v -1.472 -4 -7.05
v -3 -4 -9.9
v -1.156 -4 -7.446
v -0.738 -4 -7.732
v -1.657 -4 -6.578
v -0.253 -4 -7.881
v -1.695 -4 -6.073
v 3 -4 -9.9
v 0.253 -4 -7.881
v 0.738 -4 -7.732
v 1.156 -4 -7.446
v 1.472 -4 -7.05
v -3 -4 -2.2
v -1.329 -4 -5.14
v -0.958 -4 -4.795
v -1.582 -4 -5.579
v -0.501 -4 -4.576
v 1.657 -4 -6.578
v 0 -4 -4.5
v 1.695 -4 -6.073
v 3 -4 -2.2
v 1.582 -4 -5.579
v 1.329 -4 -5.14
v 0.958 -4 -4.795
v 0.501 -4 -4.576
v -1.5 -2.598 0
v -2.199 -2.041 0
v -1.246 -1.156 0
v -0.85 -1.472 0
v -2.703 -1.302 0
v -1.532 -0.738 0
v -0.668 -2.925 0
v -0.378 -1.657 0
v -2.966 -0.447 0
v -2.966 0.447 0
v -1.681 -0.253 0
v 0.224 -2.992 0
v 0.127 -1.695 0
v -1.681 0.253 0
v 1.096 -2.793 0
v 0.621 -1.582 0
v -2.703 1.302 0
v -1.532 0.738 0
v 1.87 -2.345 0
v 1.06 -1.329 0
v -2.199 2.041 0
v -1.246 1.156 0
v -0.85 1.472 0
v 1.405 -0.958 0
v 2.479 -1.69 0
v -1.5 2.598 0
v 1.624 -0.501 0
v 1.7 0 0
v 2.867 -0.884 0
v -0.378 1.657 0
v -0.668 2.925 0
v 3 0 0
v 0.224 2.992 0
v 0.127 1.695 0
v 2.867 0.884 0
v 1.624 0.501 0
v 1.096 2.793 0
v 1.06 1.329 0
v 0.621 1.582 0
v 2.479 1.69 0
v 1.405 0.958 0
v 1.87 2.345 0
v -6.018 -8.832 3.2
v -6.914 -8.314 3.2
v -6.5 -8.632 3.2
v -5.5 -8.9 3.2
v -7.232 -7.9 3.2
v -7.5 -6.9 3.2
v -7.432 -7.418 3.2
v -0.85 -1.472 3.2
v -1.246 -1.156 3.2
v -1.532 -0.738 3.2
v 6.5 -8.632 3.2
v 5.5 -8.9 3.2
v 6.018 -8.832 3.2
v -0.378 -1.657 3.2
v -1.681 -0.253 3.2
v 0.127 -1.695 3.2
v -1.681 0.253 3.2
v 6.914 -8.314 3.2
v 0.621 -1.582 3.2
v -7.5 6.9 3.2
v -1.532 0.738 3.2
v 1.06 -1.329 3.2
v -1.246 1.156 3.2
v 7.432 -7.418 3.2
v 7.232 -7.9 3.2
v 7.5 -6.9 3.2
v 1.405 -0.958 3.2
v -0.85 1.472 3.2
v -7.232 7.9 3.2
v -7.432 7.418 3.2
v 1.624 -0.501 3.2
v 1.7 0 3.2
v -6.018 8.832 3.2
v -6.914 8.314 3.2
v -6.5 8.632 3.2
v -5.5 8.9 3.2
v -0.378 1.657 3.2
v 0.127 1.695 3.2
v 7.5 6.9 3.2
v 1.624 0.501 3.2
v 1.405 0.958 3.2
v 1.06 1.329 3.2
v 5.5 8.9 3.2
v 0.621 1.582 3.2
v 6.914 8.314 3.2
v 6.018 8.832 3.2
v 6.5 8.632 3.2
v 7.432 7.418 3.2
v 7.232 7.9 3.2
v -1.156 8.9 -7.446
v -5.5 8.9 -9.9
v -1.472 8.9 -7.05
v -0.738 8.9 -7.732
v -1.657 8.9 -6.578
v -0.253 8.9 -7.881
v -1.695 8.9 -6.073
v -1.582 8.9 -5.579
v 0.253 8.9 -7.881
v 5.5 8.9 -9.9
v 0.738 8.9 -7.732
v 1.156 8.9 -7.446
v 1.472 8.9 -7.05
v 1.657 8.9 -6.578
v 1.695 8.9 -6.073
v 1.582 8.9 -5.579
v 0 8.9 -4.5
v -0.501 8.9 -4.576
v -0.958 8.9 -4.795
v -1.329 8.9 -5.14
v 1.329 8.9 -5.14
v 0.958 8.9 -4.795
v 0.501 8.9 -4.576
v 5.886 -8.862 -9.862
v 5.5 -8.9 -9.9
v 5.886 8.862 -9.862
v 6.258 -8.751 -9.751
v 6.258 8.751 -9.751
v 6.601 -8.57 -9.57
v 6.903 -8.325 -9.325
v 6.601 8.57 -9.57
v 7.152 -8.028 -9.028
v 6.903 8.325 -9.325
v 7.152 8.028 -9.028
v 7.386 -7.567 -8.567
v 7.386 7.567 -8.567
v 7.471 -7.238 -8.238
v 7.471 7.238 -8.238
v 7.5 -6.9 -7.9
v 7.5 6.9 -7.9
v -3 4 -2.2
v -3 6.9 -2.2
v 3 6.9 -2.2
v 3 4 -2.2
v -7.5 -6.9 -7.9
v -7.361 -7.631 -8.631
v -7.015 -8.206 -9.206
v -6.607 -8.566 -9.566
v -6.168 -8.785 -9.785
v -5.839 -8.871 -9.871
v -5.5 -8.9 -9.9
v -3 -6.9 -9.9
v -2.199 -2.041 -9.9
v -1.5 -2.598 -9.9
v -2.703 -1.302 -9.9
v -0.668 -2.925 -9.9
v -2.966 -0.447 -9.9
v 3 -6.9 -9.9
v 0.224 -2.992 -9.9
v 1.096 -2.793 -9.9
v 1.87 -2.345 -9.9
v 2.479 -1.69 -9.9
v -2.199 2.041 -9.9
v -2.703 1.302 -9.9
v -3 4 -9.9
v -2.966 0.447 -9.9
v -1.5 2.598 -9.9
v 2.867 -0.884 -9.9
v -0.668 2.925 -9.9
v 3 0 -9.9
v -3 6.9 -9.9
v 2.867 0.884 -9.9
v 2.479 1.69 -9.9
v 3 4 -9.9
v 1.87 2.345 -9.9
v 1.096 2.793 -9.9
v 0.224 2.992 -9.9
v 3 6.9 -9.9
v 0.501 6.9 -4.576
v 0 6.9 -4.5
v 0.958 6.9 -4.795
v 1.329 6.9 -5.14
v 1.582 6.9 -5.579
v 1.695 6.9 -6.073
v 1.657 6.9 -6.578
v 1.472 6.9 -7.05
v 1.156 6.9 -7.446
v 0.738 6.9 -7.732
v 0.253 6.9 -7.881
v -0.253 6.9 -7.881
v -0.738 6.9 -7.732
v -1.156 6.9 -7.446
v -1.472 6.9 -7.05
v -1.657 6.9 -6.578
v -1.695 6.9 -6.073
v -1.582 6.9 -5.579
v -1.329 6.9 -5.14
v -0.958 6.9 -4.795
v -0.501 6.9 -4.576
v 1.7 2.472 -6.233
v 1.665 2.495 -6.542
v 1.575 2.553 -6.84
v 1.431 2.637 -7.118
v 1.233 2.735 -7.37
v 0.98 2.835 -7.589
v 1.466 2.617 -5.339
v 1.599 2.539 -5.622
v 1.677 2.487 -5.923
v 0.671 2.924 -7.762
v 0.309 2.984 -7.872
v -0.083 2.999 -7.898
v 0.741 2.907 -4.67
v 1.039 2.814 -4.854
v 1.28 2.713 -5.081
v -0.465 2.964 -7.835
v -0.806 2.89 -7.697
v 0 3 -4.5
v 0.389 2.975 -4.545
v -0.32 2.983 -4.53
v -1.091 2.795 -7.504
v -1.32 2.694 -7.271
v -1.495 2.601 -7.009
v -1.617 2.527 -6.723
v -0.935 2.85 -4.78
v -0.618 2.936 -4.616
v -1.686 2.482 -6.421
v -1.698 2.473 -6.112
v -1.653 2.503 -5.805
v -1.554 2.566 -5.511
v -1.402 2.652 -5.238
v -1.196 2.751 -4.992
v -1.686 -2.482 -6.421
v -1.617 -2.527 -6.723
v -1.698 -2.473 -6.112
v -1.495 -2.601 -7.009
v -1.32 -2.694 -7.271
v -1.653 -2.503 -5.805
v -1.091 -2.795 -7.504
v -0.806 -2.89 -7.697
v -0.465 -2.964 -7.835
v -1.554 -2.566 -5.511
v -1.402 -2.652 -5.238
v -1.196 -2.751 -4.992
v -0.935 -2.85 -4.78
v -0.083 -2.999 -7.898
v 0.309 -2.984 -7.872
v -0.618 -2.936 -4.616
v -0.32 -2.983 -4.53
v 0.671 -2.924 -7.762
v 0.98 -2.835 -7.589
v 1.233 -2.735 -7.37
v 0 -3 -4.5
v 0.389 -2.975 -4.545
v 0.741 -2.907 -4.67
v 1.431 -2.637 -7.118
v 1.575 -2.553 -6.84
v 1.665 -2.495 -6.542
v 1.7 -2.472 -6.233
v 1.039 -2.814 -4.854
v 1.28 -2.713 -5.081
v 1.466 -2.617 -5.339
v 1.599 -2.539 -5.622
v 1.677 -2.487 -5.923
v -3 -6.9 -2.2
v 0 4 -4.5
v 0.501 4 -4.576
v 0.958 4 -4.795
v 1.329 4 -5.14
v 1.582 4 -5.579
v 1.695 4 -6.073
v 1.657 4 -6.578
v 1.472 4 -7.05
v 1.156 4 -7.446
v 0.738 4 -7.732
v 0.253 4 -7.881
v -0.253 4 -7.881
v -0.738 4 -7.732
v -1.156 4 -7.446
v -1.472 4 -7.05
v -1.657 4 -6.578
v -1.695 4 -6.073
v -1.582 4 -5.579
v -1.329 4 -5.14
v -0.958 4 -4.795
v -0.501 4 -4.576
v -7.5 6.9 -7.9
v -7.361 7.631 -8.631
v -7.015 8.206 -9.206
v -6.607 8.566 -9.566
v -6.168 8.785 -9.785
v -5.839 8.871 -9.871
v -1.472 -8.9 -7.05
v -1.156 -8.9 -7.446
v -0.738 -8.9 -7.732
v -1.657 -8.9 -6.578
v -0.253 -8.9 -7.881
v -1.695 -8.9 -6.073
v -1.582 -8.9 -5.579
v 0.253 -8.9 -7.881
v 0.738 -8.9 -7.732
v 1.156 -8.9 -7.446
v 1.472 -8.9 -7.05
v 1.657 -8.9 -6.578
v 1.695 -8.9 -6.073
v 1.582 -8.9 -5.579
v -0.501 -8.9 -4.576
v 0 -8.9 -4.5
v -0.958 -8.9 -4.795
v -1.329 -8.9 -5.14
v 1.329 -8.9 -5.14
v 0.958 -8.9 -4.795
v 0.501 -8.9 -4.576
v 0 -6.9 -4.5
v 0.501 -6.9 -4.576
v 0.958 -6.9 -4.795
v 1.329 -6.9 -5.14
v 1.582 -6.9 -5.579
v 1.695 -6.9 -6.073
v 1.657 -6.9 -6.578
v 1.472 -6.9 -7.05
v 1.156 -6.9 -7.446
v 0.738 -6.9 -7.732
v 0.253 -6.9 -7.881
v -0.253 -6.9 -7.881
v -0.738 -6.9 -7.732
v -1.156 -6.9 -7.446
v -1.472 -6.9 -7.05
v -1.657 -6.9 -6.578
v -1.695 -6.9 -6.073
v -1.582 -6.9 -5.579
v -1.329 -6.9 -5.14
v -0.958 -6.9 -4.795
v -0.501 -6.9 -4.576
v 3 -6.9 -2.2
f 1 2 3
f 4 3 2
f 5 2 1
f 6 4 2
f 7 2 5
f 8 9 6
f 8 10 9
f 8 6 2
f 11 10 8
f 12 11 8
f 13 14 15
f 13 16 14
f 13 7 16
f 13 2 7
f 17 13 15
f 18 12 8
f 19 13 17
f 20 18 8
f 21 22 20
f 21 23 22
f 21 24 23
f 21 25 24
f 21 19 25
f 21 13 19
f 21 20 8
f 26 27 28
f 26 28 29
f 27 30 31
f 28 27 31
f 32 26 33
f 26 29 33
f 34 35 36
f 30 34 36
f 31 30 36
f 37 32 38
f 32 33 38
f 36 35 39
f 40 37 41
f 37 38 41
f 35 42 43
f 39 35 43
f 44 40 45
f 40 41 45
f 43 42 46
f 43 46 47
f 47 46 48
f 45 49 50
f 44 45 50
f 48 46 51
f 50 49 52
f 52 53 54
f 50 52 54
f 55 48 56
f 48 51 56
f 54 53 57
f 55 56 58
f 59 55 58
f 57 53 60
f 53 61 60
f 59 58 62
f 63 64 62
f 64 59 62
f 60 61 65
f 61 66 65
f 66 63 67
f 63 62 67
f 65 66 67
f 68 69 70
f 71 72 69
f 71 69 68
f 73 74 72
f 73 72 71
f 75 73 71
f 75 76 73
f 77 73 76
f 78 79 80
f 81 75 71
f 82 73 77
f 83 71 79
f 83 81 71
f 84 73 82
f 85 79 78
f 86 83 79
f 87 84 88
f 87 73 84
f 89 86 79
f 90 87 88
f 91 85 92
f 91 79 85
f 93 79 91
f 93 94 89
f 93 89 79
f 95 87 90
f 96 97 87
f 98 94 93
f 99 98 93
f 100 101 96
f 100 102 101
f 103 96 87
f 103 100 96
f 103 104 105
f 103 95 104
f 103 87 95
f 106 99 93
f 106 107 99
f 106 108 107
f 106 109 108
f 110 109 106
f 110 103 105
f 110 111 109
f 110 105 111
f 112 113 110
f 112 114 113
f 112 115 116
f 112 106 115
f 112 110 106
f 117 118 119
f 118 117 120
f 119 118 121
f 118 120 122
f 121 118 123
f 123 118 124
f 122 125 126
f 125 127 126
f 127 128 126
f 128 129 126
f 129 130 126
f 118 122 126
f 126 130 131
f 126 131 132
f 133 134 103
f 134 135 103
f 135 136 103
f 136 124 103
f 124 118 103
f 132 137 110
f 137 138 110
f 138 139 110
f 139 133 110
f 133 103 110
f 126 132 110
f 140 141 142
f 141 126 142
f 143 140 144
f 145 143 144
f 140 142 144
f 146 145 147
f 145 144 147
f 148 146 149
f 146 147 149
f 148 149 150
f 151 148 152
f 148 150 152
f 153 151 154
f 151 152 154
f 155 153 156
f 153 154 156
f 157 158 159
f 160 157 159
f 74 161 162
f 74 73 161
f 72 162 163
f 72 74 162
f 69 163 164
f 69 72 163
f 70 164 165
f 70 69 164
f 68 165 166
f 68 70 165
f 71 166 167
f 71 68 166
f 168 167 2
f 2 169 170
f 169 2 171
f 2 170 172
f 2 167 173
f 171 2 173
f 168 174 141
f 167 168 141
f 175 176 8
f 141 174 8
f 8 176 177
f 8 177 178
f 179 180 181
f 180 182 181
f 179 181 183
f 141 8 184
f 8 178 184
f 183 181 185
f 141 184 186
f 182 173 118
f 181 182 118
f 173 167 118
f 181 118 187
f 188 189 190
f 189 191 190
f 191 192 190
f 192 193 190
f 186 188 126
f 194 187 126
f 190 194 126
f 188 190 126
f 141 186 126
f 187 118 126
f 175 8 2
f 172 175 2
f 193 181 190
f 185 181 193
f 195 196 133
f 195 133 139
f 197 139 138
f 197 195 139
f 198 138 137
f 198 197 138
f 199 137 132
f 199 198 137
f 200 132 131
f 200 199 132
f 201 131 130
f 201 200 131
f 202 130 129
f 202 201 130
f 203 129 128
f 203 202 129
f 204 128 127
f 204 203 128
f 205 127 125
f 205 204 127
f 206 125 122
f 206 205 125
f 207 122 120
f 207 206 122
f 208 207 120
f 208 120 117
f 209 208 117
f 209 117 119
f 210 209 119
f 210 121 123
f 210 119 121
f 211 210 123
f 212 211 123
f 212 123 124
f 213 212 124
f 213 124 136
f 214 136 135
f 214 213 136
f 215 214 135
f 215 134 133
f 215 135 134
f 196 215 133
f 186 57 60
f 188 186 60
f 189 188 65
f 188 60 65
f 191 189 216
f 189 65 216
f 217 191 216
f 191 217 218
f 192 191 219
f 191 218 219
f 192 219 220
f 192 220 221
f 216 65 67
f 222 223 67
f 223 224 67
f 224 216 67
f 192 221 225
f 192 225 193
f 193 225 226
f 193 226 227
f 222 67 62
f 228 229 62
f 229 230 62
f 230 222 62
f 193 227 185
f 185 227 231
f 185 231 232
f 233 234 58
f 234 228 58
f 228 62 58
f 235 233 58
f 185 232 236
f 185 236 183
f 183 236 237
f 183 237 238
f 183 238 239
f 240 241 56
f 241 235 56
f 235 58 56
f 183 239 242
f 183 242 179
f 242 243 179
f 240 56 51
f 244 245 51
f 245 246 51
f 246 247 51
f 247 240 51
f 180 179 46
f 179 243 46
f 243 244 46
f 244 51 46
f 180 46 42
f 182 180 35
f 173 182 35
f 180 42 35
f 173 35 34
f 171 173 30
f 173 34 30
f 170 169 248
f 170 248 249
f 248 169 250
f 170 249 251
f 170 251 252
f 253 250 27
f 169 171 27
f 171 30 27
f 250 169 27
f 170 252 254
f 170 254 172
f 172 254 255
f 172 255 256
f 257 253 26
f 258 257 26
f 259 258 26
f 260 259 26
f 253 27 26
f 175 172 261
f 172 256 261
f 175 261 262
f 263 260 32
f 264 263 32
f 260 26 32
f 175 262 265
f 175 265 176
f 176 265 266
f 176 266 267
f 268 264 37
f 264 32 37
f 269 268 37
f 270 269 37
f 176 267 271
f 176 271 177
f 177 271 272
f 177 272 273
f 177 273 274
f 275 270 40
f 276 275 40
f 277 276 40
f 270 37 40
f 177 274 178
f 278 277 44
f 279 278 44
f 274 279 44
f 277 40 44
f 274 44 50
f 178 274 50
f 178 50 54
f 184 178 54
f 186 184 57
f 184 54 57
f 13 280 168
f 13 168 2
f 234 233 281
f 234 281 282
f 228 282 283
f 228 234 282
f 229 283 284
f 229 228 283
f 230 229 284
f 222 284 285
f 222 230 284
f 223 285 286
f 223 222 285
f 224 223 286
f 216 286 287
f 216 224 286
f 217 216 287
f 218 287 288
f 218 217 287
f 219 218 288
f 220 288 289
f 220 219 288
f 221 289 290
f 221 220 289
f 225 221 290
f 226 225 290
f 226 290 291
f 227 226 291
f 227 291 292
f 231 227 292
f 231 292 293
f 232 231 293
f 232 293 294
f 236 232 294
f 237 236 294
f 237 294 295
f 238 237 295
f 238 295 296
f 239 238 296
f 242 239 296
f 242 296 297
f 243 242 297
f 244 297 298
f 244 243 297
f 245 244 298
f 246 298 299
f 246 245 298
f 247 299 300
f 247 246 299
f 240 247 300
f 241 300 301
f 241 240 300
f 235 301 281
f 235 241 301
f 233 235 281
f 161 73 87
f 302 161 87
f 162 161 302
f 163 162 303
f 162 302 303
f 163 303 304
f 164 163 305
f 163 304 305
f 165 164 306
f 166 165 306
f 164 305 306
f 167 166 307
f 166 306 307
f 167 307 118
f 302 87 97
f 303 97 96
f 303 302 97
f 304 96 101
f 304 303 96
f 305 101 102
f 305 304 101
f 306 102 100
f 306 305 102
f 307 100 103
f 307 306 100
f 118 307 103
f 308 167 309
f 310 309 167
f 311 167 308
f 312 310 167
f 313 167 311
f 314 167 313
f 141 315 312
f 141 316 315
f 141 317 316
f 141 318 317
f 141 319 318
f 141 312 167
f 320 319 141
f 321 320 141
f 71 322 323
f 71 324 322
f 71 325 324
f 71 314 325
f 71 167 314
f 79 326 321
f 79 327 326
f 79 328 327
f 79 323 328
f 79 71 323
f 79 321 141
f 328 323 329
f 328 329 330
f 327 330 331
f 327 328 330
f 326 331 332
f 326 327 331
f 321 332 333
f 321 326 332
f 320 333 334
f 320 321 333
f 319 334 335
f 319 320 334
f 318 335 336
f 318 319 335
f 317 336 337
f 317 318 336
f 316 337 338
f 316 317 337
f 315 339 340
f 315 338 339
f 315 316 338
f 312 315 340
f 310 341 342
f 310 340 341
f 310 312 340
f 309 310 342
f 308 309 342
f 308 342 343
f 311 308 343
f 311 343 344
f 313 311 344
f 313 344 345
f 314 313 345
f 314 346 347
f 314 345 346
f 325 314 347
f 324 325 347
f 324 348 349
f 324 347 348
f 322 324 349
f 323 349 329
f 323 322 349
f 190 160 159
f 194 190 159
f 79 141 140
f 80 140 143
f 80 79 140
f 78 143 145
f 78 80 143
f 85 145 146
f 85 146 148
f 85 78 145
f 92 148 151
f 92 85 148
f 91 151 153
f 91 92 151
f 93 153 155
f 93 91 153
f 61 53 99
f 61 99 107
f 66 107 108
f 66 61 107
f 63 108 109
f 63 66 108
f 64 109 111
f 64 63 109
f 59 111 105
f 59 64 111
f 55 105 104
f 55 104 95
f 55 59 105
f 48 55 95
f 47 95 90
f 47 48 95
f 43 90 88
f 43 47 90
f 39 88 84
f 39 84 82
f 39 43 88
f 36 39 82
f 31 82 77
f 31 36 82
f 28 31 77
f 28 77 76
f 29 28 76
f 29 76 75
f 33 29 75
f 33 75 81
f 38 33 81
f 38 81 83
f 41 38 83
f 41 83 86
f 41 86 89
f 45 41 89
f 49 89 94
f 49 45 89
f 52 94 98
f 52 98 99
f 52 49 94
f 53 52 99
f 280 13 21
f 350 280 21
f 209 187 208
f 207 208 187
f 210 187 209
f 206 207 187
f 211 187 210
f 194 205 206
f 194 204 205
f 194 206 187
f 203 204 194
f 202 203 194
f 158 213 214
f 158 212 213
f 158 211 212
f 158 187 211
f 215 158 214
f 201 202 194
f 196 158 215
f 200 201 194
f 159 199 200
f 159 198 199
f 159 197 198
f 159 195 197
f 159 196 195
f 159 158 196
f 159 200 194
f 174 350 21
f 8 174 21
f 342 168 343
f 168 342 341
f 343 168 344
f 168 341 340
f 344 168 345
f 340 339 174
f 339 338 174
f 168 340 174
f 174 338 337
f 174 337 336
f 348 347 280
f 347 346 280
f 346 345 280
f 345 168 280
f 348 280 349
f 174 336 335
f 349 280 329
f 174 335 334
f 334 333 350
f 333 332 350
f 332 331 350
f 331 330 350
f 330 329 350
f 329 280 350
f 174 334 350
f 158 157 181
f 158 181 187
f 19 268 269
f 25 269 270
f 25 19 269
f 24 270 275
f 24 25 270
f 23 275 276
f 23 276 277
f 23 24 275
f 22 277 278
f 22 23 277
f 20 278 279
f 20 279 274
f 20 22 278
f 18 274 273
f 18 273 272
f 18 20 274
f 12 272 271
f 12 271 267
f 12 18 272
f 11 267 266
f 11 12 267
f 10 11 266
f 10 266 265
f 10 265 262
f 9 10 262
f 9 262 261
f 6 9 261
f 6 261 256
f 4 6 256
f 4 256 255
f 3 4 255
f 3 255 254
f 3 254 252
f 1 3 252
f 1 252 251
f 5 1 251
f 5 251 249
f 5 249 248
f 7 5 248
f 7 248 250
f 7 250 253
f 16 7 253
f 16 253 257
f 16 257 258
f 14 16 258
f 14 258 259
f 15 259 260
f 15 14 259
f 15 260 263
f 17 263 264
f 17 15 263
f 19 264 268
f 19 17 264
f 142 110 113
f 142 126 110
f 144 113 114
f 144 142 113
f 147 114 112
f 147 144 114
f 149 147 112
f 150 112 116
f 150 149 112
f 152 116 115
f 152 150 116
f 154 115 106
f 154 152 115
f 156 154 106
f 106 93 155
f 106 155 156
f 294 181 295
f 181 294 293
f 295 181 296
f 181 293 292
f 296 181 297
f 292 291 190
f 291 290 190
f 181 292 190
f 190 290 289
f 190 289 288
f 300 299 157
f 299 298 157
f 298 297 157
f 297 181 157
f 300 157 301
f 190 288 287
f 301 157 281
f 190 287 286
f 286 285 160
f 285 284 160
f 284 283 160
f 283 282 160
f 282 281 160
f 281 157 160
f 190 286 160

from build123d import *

# Parameters (mm, degrees)
SKETCH_1_W               = 15
SKETCH_1_H               = 17.8
SKETCH_1_R               = 3
SKETCH_1_W_2             = 6
SKETCH_1_H_2             = 2.9
SKETCH_1_R_2             = 1.7
EXTRUDE_1_DEPTH          = 3.2
SKETCH_1_3_W             = 15
SKETCH_1_3_H             = 17.8
SKETCH_1_3_R             = 3
SKETCH_1_3_W_2           = 6
SKETCH_1_3_H_2           = 2.9
EXTRUDE_2_DEPTH          = 2.2
EXTRUDE_START            = -2.2
SKETCH_1_4_W             = 15
SKETCH_1_4_H             = 17.8
SKETCH_1_4_R             = 3
SKETCH_1_4_W_2           = 6
SKETCH_1_4_H_2           = 2.9
EXTRUDE_3_DEPTH          = 7.7
CUT_EXTRUDE_1_DEPTH      = 16.279725128
CUT_EXTRUDE_1_DEPTH_BACK = 16.279725128
SKETCH_2_R               = 1.7
FILLET_1_R               = 2


with BuildPart() as part:
    # 草图1 → 凸台-拉伸1 (new body)
    # profile 1 of 4: a face of its own
    with BuildSketch(Plane.XY):
        Rectangle(SKETCH_1_W, SKETCH_1_H)
        Circle(SKETCH_1_R, mode=Mode.SUBTRACT)
        with Locations((0, -5.45)):
            Rectangle(SKETCH_1_W_2, SKETCH_1_H_2, mode=Mode.SUBTRACT)
        with Locations((0, 5.45)):
            Rectangle(SKETCH_1_W_2, SKETCH_1_H_2, mode=Mode.SUBTRACT)
    # profile 2 of 4: a face of its own
    with BuildSketch(Plane.XY):
        Circle(SKETCH_1_R)
        Circle(SKETCH_1_R_2, mode=Mode.SUBTRACT)
    # profile 3 of 4: a face of its own
    with BuildSketch(Plane.XY):
        with Locations((0, 5.45)):
            Rectangle(SKETCH_1_W_2, SKETCH_1_H_2)
    # profile 4 of 4: a face of its own
    with BuildSketch(Plane.XY):
        with Locations((0, -5.45)):
            Rectangle(SKETCH_1_W_2, SKETCH_1_H_2)
    extrude(amount=EXTRUDE_1_DEPTH)

    # 草图1<3> → 凸台-拉伸2 (add)
    # profile 1 of 3: a face of its own
    with BuildSketch(Plane.XY):
        Rectangle(SKETCH_1_3_W, SKETCH_1_3_H)
        Circle(SKETCH_1_3_R, mode=Mode.SUBTRACT)
        with Locations((0, -5.45)):
            Rectangle(SKETCH_1_3_W_2, SKETCH_1_3_H_2, mode=Mode.SUBTRACT)
        with Locations((0, 5.45)):
            Rectangle(SKETCH_1_3_W_2, SKETCH_1_3_H_2, mode=Mode.SUBTRACT)
    # profile 2 of 3: a face of its own
    with BuildSketch(Plane.XY):
        with Locations((0, 5.45)):
            Rectangle(SKETCH_1_3_W_2, SKETCH_1_3_H_2)
    # profile 3 of 3: a face of its own
    with BuildSketch(Plane.XY):
        with Locations((0, -5.45)):
            Rectangle(SKETCH_1_3_W_2, SKETCH_1_3_H_2)
    extrude(amount=-EXTRUDE_2_DEPTH)

    # 草图1<4> → 凸台-拉伸3 (add)
    with BuildSketch(Plane.XY.offset(EXTRUDE_START)):
        Rectangle(SKETCH_1_4_W, SKETCH_1_4_H)
        Circle(SKETCH_1_4_R, mode=Mode.SUBTRACT)
        with Locations((0, -5.45)):
            Rectangle(SKETCH_1_4_W_2, SKETCH_1_4_H_2, mode=Mode.SUBTRACT)
        with Locations((0, 5.45)):
            Rectangle(SKETCH_1_4_W_2, SKETCH_1_4_H_2, mode=Mode.SUBTRACT)
    extrude(amount=-EXTRUDE_3_DEPTH)

    # 草图2 → 切除-拉伸1 (cut, two sides: drawn at the far end of the back side and taken through both)
    with BuildSketch(Plane(origin=(0, 0, 0), x_dir=(1, 0, 0), z_dir=(0, 1, 0)).offset(-CUT_EXTRUDE_1_DEPTH_BACK)):
        with Locations(Location((0, 6.2, 0), (0, 0, 270))):
            Circle(SKETCH_2_R)
    extrude(amount=CUT_EXTRUDE_1_DEPTH + CUT_EXTRUDE_1_DEPTH_BACK, mode=Mode.SUBTRACT)

    # 圆角1
    fillet_1_edges = [part.edges().sort_by_distance(p)[0] for p in [
        (-7.5, -8.9, -3.35),
        (-7.5, 8.9, -3.35),
        (7.5, 8.9, -3.35),
        (7.5, -8.9, -3.35),
        (-7.5, 0, -9.9),
        (7.5, 0, -9.9),
    ]]
    fillet(fillet_1_edges, radius=FILLET_1_R)


solid = part.part
